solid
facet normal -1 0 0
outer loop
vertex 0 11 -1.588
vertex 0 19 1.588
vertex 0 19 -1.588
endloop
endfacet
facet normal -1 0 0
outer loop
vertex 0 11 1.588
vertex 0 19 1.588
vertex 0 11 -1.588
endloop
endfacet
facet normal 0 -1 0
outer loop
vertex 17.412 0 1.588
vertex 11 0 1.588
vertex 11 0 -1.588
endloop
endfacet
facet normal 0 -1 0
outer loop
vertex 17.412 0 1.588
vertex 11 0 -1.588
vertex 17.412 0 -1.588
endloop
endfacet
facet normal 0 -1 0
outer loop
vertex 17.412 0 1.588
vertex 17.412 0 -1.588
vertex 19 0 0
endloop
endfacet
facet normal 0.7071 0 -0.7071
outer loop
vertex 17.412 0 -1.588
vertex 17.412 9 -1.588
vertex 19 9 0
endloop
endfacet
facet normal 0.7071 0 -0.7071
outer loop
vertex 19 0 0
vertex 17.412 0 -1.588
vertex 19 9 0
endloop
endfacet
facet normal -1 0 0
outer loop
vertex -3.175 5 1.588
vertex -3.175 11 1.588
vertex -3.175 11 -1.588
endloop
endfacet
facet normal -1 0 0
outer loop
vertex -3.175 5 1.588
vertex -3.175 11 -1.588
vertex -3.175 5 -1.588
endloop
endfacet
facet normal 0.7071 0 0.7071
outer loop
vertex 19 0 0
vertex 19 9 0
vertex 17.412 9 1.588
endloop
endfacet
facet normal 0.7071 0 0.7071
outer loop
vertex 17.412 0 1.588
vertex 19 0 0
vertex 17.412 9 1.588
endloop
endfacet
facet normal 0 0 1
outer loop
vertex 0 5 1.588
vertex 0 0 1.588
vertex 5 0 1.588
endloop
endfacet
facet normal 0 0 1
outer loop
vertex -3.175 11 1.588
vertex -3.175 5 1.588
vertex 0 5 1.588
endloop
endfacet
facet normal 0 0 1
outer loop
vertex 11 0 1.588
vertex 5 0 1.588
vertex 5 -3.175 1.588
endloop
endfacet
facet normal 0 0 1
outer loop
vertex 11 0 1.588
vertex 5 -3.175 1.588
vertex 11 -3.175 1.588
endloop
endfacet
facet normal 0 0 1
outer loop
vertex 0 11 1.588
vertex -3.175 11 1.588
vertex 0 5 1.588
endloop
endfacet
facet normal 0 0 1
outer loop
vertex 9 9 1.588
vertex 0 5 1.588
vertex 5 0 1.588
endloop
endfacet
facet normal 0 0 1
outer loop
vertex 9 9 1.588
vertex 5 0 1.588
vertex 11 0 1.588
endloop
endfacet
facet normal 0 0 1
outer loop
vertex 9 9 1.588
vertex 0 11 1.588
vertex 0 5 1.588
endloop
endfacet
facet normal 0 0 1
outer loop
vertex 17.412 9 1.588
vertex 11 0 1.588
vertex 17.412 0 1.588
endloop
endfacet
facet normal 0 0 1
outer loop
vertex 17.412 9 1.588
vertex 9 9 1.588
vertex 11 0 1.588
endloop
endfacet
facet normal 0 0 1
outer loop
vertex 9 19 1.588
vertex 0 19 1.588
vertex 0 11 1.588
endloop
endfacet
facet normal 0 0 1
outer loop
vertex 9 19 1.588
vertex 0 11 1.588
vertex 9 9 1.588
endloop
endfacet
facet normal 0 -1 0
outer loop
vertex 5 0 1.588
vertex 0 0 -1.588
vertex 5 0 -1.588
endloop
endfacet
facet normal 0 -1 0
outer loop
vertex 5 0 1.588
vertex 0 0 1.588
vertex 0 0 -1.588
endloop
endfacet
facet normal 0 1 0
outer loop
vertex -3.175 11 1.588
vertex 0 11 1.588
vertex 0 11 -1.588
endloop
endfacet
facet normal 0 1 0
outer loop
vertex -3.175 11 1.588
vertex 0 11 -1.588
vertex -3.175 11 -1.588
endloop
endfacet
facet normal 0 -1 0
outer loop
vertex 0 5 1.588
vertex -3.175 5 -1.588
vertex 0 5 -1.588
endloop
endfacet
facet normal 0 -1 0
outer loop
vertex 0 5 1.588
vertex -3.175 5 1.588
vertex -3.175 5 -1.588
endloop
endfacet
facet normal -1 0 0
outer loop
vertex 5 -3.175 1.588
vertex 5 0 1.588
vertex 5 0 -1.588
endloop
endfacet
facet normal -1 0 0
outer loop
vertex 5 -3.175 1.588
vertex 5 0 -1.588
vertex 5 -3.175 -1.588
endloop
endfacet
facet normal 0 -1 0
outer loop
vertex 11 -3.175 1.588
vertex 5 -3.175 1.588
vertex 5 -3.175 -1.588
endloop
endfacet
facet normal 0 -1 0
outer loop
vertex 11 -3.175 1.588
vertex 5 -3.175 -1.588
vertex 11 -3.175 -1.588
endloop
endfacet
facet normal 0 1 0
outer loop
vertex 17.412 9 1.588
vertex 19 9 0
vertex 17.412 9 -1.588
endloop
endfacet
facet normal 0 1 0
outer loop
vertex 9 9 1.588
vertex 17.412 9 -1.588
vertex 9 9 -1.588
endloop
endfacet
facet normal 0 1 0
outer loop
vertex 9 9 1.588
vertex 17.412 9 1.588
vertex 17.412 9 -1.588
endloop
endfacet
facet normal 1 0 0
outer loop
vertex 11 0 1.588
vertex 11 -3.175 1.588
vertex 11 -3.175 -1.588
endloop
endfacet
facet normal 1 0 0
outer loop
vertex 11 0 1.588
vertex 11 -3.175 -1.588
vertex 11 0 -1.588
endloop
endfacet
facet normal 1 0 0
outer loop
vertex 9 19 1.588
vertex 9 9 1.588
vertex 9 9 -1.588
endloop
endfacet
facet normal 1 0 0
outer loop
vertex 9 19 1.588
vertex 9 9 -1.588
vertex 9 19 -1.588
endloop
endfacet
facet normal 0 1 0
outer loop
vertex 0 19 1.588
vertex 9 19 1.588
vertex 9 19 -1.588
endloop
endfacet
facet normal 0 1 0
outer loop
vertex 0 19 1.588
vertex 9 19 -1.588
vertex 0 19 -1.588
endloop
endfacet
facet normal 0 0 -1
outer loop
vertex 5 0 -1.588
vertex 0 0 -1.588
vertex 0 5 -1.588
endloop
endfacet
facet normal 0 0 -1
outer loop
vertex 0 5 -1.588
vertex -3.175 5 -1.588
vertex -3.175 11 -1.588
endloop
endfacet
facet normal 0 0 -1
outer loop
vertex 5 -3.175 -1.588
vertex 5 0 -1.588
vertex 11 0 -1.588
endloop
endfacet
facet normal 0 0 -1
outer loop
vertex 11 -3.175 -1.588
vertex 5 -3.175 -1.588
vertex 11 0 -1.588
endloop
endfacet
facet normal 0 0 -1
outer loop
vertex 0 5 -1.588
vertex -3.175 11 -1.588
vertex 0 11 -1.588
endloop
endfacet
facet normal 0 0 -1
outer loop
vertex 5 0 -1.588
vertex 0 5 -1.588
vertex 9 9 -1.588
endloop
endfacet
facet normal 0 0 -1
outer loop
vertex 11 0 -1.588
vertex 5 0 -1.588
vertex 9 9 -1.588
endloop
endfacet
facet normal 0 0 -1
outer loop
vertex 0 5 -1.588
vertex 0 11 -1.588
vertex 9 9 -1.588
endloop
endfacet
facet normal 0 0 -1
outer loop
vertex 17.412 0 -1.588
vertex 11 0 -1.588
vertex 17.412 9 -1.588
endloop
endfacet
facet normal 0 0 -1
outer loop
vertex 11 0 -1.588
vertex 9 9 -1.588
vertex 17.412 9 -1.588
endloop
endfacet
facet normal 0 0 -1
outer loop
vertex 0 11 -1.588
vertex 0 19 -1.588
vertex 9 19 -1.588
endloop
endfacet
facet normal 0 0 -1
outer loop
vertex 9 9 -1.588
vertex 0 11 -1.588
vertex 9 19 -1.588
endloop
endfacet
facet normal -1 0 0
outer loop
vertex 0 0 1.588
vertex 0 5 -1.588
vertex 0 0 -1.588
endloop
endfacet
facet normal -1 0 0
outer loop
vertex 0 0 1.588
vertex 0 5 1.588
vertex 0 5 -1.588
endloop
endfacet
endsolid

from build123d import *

# Parameters (mm, degrees)
BOSS_EXTRUDE1_DEPTH = 1.5875
CUT_EXTRUDE3_DEPTH  = 10


with BuildPart() as part:
    # Sketch1 → Boss-Extrude1 (new, symmetric)
    with BuildSketch(Plane.XY):
        Polygon((0, 0), (5, 0), (5, -3.175), (11, -3.175), (11, 0), (19, 0), (19, 9), (9, 9), (9, 19), (0, 19), (0, 11), (-3.175, 11), (-3.175, 5), (0, 5), align=None)
    extrude(amount=BOSS_EXTRUDE1_DEPTH, both=True)

    # Sketch2 → Cut-Extrude3 (cut, symmetric)
    with BuildSketch(Plane(origin=(0, 9, 0), x_dir=(1, 0, 0), z_dir=(0, 1, 0))):
        Polygon((19, 0), (17.4125, -1.5875), (19.19836718, -4.188524989), (21.145490005, 0), (20.434145586, 3.927655586), (17.4125, 1.5875), align=None)
    extrude(amount=CUT_EXTRUDE3_DEPTH, both=True, mode=Mode.SUBTRACT)


solid = part.part
